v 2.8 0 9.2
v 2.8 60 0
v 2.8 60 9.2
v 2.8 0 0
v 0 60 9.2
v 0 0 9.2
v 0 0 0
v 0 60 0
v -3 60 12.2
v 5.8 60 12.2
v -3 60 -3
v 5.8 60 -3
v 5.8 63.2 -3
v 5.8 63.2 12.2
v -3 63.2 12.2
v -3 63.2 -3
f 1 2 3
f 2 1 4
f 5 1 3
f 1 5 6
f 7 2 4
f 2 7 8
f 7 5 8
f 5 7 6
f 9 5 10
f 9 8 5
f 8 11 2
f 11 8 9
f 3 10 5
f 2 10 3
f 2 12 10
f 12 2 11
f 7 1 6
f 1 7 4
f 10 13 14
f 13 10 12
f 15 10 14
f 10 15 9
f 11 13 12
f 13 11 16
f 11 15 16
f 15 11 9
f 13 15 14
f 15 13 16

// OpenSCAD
cube([2.8, 60, 9.2]);
translate([-3, 60, -3])
cube([8.8, 3.2, 15.2]);
